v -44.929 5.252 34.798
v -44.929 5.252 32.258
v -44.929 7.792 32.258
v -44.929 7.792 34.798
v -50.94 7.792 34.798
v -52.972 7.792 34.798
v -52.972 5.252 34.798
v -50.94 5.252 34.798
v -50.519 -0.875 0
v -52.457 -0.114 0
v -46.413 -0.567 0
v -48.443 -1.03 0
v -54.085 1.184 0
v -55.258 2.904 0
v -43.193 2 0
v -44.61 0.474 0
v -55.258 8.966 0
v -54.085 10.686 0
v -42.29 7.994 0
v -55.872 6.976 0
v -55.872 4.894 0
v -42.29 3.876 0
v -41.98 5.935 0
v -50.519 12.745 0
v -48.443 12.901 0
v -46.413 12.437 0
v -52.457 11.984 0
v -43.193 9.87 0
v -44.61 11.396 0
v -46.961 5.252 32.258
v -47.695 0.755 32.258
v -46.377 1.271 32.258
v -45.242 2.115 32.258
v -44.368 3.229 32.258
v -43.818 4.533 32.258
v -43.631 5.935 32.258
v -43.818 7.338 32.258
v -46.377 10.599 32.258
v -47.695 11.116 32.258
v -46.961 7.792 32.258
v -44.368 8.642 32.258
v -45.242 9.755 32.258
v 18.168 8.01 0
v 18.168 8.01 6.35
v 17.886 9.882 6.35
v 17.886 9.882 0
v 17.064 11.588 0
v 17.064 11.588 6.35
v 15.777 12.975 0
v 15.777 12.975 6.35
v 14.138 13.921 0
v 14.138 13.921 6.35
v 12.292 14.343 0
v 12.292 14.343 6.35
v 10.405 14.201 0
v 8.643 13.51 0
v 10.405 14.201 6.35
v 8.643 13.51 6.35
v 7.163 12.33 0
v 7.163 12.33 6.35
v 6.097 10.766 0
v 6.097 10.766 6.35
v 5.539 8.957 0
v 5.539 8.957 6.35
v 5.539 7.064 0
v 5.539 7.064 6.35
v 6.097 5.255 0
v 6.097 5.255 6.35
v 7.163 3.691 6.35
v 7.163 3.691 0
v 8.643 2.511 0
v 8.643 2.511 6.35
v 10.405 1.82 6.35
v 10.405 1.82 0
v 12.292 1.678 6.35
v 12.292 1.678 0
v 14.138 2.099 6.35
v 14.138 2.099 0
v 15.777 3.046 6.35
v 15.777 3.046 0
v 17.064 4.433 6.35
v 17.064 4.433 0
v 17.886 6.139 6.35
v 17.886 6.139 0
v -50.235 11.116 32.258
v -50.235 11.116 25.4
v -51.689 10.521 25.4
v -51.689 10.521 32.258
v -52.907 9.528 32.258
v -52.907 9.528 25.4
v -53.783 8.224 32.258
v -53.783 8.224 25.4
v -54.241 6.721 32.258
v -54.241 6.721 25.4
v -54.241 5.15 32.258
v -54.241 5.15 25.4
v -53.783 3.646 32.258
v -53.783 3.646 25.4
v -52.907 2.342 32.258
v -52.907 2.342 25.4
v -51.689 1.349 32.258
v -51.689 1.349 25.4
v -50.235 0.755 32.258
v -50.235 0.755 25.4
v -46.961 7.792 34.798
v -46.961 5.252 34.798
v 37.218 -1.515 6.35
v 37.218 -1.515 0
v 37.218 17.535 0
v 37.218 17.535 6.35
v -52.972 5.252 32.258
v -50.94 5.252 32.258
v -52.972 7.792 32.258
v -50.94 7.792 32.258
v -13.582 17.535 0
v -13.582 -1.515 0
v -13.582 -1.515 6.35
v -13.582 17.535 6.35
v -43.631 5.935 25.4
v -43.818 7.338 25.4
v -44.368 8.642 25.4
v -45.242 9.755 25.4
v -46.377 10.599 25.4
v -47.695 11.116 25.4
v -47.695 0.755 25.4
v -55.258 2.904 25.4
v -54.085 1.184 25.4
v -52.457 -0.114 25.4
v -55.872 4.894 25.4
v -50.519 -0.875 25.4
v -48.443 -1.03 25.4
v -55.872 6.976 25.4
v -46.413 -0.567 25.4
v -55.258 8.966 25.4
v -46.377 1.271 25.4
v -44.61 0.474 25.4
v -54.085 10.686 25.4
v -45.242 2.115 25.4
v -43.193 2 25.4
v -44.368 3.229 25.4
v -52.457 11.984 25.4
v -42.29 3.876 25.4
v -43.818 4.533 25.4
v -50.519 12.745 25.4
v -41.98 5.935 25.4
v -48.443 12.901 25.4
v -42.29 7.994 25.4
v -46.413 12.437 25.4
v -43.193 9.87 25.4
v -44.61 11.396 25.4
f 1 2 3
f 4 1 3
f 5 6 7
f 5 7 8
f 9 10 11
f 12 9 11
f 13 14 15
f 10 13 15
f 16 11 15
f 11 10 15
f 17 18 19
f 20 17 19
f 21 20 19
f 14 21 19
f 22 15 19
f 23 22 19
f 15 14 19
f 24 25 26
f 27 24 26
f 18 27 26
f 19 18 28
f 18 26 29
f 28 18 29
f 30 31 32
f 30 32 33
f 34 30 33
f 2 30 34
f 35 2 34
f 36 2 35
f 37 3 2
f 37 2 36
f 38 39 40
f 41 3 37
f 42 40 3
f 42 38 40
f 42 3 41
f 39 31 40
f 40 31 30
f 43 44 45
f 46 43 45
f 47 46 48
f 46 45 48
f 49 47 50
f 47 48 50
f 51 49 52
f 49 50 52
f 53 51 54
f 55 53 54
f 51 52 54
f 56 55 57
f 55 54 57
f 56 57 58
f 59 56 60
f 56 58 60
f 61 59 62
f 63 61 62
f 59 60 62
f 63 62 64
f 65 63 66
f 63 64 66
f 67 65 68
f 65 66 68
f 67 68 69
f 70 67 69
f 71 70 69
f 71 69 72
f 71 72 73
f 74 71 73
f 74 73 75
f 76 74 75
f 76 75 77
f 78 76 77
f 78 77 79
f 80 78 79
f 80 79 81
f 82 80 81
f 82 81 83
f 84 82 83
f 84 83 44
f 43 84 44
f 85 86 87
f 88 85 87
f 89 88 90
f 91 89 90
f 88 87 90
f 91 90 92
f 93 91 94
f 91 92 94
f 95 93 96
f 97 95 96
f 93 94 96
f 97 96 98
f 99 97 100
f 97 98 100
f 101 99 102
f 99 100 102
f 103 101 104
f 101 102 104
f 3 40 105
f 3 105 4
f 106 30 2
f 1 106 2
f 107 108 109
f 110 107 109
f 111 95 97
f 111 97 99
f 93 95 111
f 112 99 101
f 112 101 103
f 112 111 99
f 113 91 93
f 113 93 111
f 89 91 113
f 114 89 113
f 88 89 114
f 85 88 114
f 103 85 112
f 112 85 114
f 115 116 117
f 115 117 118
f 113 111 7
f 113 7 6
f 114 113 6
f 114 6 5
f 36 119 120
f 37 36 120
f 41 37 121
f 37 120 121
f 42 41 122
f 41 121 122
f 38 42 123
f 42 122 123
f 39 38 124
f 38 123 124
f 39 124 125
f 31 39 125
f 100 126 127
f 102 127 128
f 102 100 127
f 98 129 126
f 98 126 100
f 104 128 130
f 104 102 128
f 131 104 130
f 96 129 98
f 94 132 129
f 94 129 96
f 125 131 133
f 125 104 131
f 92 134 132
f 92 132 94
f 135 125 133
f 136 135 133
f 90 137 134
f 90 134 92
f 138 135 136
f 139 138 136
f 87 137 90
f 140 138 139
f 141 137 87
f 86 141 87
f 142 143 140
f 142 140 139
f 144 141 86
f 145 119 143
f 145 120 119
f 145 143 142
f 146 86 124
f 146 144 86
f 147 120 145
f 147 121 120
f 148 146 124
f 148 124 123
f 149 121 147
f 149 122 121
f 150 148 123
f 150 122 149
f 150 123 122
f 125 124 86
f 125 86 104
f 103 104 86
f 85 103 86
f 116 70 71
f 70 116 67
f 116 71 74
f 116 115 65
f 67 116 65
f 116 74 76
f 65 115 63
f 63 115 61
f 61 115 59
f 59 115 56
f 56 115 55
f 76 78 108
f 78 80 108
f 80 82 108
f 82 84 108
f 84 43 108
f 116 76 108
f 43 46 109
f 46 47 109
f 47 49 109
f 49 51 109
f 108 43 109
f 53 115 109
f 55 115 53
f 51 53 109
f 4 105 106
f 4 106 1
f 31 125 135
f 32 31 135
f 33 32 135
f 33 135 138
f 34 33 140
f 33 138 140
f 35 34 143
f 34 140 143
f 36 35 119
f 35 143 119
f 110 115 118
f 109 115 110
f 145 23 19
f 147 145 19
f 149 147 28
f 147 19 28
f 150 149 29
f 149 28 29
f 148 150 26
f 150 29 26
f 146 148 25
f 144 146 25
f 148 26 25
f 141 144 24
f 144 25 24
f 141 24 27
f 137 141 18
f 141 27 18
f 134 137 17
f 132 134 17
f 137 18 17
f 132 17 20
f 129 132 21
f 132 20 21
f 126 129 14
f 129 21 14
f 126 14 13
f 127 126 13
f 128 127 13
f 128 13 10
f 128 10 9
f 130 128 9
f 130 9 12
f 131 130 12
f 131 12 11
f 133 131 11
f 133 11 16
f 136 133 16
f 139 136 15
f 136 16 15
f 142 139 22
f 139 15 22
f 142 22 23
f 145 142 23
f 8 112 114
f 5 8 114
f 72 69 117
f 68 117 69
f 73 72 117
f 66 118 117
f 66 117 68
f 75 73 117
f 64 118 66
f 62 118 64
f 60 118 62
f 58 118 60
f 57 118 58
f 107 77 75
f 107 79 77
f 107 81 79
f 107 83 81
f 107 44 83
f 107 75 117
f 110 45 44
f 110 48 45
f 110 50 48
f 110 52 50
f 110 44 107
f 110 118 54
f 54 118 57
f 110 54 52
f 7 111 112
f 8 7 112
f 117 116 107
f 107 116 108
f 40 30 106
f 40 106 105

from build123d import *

# Parameters (mm, degrees)
F0_W     = 50.8
F0_H     = 19.05
F1_DEPTH = 6.35
F2_R     = 6.35
F3_DEPTH = 25.4
F4_R     = 6.985
F5_DEPTH = 25.4
F7_DEPTH = 6.858
F8_W     = 2.032
F8_H     = 2.54
F9_DEPTH = 2.54


with BuildPart() as f1:
    # F0 (on Top) → F1 (new body)
    with BuildSketch(Plane.XY):
        with Locations((11.8177033305, 8.0104206771)):
            Rectangle(F0_W, F0_H)
    extrude(amount=F1_DEPTH)

    # F2 (on face) → F3 (cut)
    with BuildSketch(Plane.XY.offset(6.35)):
        with Locations((11.8177033305, 8.0104206771)):
            Circle(F2_R)
    extrude(amount=-F3_DEPTH, mode=Mode.SUBTRACT)


with BuildPart() as f5:
    # F4 (on Top) → F5 (new body)
    with BuildSketch(Plane.XY):
        with Locations((-48.9647500217, 5.9351217933)):
            Circle(F4_R)
    extrude(amount=F5_DEPTH)

    # F6 (on face) → F7 (join)
    with BuildSketch(Plane.XY.offset(25.4)):
        with BuildLine():
            ThreePointArc((-47.6947500217, 0.7545179675), (-44.7679812647, 2.6429055185), (-43.6307500217, 5.9351217933))
            ThreePointArc((-43.6307500217, 5.9351217933), (-44.7679812647, 9.2273380681), (-47.6947500217, 11.1157256191))
            Line((-47.6947500217, 11.1157256191), (-47.6947500217, 5.9351217933))
            Line((-47.6947500217, 5.9351217933), (-47.6947500217, 0.7545179675))
        make_face()
        with BuildLine():
            Line((-50.2347500217, 5.9351217933), (-50.2347500217, 11.1157256191))
            ThreePointArc((-50.2347500217, 11.1157256191), (-54.2987500217, 5.9351217933), (-50.2347500217, 0.7545179675))
            Line((-50.2347500217, 0.7545179675), (-50.2347500217, 5.9351217933))
        make_face()
    extrude(amount=F7_DEPTH)

    # F8 (on face) → F9 (join)
    with BuildSketch(Plane.XY.offset(32.258)):
        with Locations((-45.9452590969, 6.5218828465)):
            Rectangle(F8_W, F8_H)
        with Locations((-51.9555083539, 6.5218828465)):
            Rectangle(F8_W, F8_H)
    extrude(amount=F9_DEPTH)


solid = Compound([f1.part, f5.part])
